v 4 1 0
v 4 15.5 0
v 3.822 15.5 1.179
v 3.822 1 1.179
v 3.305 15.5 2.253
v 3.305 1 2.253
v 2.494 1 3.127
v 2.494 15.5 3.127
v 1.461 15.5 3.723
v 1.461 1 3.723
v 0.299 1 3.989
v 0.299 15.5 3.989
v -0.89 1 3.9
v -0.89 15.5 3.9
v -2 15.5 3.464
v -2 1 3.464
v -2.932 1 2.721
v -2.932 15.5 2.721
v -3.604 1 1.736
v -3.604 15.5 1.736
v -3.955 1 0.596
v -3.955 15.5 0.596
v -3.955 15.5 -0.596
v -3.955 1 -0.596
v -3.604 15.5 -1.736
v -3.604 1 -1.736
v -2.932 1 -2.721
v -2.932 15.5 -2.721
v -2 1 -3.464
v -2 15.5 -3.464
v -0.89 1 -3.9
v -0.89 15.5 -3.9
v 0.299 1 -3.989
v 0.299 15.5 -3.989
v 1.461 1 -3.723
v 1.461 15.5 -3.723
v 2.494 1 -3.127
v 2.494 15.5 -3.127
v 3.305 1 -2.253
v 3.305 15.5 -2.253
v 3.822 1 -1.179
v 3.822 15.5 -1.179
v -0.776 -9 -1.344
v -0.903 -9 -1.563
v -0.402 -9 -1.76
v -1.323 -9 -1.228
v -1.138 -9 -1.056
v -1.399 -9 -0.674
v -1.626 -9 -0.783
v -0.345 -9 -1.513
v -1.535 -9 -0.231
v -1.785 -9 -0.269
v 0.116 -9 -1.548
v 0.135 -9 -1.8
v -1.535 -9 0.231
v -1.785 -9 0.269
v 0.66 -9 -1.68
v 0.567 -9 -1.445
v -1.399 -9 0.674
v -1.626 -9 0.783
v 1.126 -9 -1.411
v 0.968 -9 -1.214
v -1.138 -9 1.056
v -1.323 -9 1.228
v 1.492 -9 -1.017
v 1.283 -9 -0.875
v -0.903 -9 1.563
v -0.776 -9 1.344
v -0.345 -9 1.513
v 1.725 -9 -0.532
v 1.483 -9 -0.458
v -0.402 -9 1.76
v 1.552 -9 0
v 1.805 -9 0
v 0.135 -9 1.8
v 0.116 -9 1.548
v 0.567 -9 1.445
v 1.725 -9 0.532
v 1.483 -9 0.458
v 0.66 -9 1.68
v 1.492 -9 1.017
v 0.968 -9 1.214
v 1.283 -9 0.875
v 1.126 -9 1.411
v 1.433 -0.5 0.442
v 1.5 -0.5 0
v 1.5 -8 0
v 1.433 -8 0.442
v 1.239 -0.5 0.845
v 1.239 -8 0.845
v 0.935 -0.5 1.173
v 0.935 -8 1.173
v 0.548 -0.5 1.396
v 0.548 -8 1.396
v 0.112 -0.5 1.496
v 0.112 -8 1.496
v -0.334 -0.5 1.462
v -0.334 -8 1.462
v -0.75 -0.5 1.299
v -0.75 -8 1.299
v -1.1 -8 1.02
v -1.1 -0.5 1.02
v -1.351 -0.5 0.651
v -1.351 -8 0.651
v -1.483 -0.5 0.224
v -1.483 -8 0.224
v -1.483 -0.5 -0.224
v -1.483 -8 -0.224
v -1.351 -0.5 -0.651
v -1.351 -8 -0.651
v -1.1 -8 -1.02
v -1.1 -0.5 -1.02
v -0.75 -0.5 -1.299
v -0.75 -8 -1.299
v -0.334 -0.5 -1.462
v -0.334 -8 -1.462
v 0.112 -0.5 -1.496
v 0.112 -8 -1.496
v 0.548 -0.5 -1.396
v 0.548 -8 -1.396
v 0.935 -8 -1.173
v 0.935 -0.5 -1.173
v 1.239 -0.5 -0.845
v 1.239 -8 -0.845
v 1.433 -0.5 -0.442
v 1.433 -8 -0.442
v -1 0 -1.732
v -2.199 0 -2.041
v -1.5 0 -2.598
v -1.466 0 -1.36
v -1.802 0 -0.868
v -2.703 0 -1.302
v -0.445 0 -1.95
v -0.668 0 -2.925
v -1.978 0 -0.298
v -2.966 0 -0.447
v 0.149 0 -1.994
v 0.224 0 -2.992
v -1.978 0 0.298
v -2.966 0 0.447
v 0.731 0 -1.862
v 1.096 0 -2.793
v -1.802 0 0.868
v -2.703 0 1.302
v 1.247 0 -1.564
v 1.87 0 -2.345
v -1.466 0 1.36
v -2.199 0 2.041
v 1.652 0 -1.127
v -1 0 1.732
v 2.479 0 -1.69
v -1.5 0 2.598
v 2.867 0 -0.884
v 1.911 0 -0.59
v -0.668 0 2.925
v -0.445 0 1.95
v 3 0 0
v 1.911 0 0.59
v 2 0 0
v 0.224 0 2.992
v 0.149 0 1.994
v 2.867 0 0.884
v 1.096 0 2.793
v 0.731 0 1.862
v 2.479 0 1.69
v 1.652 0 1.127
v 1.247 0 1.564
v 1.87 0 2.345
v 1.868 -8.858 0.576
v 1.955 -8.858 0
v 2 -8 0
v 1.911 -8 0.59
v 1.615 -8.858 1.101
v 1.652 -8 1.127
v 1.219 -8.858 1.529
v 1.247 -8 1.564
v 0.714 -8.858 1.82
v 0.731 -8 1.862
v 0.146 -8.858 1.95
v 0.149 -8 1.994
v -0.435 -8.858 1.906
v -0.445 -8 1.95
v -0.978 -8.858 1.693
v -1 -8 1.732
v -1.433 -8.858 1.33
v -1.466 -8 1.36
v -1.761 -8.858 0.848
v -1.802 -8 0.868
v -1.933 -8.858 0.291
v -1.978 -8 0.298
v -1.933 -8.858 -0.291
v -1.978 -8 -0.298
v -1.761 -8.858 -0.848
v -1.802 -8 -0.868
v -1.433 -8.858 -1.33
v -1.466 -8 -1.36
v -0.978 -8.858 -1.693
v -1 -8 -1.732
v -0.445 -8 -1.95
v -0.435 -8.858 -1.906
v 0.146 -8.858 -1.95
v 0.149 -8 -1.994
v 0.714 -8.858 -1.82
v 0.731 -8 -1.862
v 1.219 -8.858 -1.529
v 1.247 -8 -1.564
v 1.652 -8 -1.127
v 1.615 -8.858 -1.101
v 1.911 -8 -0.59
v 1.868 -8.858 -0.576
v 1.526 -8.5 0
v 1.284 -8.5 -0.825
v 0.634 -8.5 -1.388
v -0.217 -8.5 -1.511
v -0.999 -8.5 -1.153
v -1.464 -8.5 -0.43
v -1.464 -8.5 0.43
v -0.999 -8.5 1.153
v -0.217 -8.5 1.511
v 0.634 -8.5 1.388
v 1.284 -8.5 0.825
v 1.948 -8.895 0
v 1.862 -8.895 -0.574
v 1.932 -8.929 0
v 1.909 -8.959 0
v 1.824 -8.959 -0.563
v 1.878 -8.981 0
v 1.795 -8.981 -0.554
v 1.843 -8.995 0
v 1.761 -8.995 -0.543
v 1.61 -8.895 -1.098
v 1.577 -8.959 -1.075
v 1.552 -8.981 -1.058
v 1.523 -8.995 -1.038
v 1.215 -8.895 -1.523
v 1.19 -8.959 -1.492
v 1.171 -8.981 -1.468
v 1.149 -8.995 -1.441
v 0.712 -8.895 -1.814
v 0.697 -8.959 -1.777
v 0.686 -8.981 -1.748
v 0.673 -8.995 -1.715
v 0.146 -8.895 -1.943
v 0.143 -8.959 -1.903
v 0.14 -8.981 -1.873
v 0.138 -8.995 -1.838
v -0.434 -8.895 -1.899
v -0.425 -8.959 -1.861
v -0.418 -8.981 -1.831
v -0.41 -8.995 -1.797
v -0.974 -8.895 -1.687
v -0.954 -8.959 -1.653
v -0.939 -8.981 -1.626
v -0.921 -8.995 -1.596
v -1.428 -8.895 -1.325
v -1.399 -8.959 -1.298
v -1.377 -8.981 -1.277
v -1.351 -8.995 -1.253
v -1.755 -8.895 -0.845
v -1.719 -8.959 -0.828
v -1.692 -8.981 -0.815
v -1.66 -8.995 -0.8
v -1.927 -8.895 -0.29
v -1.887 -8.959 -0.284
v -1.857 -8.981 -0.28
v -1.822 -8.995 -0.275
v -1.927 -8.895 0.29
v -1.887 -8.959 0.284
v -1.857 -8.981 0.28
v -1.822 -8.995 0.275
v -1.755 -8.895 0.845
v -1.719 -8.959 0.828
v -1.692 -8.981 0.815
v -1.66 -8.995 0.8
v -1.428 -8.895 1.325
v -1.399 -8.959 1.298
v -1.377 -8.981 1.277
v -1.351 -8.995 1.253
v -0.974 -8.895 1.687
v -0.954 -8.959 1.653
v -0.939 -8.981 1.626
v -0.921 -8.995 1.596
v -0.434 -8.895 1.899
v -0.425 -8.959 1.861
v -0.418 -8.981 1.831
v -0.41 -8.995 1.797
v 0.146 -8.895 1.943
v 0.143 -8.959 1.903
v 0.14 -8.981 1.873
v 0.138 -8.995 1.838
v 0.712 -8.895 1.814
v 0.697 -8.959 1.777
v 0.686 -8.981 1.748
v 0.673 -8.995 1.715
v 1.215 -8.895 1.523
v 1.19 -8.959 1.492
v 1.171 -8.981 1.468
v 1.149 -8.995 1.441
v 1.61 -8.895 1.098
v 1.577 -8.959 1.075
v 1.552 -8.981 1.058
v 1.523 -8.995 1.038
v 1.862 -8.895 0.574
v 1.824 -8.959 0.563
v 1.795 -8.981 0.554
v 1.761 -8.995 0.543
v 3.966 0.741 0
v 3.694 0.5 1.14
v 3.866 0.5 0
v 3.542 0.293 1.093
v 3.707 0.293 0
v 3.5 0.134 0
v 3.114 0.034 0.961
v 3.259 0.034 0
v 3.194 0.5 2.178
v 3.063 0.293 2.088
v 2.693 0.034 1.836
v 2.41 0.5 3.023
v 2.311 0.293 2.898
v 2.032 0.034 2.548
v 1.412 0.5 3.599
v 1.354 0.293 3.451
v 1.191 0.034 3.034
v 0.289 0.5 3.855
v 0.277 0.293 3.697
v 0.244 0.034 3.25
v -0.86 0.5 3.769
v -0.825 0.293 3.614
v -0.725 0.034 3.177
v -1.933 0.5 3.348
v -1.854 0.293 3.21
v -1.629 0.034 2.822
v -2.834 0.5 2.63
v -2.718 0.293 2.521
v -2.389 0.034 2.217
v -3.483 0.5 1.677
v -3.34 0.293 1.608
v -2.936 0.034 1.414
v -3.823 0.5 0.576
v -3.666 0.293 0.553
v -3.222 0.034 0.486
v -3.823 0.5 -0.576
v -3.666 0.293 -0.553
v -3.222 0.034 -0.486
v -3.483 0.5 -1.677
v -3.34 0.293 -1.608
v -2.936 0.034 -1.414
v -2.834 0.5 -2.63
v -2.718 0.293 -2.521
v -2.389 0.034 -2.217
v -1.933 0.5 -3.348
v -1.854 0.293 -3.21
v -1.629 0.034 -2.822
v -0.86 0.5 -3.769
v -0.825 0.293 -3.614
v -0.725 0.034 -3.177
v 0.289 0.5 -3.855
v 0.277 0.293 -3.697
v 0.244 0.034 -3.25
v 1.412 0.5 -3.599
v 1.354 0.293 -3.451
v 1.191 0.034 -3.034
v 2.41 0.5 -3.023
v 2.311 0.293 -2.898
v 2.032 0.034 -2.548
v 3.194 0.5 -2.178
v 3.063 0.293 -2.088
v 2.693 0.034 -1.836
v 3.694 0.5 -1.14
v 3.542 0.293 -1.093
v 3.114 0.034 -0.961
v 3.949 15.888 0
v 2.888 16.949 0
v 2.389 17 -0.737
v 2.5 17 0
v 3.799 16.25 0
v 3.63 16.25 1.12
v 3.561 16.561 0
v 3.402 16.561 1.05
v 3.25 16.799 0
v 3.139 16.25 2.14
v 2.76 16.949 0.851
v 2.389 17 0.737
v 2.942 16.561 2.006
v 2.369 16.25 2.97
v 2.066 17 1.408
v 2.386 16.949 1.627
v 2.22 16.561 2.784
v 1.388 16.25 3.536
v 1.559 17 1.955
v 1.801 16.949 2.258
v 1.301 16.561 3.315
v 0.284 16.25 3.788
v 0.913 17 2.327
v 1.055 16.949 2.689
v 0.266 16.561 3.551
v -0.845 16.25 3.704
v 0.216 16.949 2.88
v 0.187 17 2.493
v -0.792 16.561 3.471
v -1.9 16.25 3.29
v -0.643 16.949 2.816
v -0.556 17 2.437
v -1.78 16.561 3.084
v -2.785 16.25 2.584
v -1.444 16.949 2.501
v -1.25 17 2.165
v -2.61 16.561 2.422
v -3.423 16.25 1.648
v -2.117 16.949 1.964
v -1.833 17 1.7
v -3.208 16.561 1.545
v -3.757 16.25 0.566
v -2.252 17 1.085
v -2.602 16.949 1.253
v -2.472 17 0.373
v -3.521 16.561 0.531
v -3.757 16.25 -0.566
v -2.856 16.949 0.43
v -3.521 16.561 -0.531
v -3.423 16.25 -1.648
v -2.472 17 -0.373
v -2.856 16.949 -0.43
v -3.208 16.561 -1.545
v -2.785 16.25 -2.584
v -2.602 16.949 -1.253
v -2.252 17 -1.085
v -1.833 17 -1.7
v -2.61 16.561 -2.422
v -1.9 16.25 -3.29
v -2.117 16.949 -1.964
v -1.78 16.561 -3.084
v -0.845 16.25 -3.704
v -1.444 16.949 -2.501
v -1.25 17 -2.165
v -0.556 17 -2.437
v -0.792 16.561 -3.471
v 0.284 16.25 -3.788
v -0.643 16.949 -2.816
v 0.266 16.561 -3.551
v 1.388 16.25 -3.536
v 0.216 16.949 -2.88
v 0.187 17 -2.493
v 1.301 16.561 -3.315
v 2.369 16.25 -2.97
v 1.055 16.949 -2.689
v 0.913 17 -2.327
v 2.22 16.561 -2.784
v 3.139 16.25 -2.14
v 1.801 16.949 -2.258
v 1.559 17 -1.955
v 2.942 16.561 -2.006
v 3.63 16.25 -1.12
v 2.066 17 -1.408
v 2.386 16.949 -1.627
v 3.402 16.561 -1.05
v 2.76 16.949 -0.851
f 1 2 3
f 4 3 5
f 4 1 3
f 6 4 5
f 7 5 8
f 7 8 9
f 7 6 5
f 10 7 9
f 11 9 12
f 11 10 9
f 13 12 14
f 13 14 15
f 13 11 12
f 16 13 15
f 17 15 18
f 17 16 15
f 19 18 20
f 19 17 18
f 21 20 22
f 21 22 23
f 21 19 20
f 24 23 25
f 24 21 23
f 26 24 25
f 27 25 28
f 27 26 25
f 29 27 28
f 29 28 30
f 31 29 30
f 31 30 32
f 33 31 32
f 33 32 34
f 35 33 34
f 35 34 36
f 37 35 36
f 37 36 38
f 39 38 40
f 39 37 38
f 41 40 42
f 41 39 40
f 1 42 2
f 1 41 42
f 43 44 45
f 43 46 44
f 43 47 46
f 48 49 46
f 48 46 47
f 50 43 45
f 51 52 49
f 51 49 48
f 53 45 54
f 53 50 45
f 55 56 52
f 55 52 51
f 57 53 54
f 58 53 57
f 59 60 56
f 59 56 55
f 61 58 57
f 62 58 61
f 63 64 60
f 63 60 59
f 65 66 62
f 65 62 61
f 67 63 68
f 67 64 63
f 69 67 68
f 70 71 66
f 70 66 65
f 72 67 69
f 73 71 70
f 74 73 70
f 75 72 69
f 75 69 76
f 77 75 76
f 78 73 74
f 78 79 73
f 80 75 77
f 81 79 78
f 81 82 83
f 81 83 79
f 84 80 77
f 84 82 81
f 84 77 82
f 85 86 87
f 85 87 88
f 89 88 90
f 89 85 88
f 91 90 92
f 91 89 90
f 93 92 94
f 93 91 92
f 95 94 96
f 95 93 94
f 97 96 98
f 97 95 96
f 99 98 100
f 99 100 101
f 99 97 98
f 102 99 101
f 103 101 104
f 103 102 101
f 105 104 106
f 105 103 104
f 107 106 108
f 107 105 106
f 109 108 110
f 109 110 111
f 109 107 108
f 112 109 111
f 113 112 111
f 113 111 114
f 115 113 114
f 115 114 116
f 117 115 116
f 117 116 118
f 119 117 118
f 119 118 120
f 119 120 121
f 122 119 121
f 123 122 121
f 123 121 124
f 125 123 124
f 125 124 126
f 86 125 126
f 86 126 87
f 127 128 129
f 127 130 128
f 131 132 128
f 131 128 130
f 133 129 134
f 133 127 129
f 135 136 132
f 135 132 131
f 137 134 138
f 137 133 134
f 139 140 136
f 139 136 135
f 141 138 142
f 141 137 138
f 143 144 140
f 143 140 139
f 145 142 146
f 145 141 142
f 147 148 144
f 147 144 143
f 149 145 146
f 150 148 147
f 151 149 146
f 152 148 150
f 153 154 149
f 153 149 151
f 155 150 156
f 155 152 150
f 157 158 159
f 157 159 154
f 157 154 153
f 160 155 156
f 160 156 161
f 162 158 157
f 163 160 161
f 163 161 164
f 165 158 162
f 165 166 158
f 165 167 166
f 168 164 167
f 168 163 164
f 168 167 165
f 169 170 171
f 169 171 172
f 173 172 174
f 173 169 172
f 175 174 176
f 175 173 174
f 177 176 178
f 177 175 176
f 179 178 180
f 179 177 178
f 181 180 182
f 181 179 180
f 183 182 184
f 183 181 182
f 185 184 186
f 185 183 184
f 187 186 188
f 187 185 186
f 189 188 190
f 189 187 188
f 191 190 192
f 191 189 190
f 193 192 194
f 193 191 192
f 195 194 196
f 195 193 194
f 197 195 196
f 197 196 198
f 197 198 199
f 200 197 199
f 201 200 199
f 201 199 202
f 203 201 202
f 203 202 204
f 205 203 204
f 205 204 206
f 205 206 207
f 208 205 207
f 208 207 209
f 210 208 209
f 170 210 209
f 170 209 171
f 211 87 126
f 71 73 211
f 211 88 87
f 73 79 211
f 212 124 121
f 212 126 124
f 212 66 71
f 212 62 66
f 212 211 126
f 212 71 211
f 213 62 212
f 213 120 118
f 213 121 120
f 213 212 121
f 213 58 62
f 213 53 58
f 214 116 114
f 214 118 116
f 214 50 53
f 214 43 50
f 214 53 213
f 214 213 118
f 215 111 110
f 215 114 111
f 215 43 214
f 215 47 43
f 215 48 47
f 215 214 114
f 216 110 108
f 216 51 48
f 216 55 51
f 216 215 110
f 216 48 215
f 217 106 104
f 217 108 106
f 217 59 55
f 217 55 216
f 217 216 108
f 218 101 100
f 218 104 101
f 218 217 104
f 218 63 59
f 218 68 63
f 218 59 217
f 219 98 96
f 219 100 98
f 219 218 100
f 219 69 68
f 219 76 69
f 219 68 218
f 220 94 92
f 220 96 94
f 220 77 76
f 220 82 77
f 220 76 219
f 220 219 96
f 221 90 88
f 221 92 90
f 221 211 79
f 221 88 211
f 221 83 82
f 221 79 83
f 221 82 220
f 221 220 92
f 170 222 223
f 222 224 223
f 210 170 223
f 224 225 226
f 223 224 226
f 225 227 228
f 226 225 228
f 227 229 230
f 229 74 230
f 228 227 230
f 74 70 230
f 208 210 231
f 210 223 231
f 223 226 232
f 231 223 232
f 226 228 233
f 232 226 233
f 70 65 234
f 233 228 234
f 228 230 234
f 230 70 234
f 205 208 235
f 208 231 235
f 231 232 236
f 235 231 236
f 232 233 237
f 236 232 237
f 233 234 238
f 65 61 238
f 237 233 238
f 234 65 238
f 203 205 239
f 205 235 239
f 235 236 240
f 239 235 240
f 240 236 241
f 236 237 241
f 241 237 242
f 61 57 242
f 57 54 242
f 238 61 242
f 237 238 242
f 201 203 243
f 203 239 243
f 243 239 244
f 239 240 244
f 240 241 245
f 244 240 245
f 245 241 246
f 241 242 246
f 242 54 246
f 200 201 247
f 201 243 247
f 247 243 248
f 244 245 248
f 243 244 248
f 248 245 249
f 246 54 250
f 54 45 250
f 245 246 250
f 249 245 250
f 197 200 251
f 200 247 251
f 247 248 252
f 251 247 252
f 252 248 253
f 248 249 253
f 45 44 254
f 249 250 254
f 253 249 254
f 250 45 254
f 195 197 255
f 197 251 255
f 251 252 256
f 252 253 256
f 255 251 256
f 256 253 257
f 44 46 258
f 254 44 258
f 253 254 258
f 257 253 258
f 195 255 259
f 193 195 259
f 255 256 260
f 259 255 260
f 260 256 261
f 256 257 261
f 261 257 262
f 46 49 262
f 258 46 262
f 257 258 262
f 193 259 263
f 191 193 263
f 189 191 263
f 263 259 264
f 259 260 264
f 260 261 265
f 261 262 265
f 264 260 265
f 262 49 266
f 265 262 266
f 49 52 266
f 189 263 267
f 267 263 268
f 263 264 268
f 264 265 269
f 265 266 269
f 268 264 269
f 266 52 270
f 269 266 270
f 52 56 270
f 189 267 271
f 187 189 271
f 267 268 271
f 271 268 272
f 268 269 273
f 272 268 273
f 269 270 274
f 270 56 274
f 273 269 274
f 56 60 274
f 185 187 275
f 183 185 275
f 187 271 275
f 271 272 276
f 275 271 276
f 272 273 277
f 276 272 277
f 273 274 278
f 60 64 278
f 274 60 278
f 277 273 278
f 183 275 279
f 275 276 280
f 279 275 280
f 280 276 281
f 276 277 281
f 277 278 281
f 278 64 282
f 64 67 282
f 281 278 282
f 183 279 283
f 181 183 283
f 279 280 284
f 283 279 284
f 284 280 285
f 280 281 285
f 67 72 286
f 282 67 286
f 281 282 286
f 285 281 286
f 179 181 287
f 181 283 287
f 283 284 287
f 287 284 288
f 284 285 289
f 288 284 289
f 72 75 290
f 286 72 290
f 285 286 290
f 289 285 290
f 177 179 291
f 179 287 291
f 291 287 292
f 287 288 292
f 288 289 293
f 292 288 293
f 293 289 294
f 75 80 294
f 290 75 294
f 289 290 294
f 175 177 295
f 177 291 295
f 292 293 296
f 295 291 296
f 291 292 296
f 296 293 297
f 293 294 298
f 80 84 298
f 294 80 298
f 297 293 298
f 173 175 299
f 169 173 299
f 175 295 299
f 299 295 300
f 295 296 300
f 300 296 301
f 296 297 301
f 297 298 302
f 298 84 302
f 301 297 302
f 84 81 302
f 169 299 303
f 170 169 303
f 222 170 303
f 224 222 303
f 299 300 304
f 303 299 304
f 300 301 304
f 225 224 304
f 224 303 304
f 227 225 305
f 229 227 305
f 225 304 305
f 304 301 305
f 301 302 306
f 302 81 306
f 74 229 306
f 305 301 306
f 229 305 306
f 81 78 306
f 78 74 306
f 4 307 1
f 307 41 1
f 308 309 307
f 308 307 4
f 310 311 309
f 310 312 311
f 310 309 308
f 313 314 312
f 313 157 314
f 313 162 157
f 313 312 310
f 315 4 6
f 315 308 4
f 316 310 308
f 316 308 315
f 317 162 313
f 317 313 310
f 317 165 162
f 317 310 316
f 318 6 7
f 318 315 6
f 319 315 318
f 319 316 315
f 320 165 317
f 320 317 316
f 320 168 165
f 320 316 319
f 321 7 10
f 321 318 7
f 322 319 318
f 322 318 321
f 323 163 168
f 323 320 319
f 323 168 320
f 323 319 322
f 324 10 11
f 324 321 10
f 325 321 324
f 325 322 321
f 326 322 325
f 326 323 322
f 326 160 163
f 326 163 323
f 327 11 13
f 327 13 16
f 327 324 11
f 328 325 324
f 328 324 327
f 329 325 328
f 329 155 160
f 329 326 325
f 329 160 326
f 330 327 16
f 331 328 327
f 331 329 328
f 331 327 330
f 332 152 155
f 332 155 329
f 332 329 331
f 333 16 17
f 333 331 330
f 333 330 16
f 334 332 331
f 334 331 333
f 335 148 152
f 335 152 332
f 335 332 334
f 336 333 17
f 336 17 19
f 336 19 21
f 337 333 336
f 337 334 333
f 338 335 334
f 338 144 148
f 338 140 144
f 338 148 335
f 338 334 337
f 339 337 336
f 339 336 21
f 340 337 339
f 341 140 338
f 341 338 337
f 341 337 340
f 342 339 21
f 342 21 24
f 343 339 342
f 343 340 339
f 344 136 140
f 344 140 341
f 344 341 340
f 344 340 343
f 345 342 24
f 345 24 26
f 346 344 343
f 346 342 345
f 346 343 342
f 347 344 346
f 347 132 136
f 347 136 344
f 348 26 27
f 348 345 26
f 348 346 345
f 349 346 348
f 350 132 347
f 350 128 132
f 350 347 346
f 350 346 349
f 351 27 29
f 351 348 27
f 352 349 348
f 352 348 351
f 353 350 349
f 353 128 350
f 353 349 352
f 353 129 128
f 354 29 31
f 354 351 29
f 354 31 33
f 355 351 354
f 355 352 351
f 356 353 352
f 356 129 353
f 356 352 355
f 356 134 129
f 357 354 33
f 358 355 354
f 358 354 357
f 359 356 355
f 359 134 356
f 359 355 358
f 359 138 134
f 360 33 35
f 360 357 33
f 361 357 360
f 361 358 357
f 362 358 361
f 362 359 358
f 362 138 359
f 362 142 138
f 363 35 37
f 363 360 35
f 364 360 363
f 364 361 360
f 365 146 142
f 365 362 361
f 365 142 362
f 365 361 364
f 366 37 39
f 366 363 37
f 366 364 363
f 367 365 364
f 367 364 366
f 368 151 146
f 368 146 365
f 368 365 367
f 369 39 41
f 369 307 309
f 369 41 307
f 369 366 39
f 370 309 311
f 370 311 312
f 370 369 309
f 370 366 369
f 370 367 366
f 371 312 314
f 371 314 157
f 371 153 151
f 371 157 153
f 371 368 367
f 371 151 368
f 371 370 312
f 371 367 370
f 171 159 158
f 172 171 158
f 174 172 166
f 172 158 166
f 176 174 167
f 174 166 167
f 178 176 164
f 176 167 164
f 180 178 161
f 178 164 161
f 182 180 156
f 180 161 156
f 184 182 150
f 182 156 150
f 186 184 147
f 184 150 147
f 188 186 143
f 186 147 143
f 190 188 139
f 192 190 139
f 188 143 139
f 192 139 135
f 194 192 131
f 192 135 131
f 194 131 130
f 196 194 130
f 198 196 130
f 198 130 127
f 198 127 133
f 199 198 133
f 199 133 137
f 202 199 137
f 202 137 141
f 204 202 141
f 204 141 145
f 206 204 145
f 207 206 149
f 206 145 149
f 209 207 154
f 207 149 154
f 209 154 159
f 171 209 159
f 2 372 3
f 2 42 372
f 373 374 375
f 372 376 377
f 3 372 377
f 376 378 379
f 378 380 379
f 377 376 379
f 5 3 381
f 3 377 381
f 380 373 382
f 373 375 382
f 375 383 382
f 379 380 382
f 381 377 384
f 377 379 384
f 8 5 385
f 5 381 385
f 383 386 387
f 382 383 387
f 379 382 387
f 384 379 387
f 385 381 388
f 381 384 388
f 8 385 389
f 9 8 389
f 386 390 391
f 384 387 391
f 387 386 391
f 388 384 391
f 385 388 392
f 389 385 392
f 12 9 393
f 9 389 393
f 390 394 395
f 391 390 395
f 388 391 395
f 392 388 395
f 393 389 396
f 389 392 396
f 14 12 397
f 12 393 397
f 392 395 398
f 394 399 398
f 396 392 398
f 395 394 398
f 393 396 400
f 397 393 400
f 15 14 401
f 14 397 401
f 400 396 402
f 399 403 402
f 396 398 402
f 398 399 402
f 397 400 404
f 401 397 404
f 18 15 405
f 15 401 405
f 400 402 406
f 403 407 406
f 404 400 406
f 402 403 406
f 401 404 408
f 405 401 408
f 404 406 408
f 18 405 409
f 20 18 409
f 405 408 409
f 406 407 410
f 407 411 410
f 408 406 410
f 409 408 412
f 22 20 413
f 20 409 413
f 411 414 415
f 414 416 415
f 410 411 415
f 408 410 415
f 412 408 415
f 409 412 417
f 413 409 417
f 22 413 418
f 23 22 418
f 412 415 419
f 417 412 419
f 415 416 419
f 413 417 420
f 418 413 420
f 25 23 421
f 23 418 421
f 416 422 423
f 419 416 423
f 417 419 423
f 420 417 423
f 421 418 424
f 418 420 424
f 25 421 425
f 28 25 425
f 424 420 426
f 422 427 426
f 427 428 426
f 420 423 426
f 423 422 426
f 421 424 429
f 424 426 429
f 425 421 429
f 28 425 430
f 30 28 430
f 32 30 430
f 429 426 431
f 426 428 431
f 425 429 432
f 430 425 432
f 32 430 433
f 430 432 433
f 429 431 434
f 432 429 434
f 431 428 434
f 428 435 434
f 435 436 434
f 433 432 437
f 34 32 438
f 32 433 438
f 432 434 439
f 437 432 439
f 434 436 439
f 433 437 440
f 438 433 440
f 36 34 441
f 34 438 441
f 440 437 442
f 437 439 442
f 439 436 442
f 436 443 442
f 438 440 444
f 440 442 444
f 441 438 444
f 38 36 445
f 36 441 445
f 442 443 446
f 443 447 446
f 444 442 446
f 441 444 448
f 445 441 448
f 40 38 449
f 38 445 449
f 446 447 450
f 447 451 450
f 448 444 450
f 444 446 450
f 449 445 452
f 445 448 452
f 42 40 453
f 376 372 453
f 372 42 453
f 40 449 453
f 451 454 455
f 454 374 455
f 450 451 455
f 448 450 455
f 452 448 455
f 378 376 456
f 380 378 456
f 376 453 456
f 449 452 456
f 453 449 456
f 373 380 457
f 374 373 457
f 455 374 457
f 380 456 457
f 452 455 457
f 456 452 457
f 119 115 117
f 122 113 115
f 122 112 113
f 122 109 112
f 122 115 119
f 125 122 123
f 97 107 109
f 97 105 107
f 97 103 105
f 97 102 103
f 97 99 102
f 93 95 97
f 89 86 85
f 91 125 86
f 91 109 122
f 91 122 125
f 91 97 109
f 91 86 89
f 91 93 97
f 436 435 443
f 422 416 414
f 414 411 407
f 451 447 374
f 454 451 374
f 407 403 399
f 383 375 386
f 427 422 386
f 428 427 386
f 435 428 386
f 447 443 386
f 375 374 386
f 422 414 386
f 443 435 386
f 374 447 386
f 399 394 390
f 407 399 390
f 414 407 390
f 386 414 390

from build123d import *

# Parameters (mm, degrees)
F0_R        = 2
F1_DEPTH    = 8
F2_T        = -0.5
F1_FACE_R   = 2
F1_FACE_R_2 = 1.5
F3_DEPTH    = 1
F3_TAPER    = 3
F4_R        = 0.15
F5_R        = 4
F6_DEPTH    = 17
F7_R        = 1
F8_R        = 1.5


with BuildPart() as f1:
    # F0 (on Front) → F1 (new body)
    with BuildSketch(Plane.XZ):
        Circle(F0_R)
    extrude(amount=F1_DEPTH)

    # F2
    f2_openings = [f1.faces().sort_by_distance(p)[0] for p in [
        (0, -8, 0),
    ]]
    offset(amount=F2_T, openings=f2_openings)

    # F1_face (on face) → F3 (join)
    with BuildSketch(Plane.XZ.offset(8)):
        Circle(F1_FACE_R)
        Circle(F1_FACE_R_2, mode=Mode.SUBTRACT)
    extrude(amount=F3_DEPTH, taper=F3_TAPER)

    # F4
    f4_edges = [f1.edges().sort_by_distance(p)[0] for p in [
        (-1.947592, -9, 0),
    ]]
    fillet(f4_edges, radius=F4_R)

    # F5 (on Front) → F6 (join)
    with BuildSketch(Plane.XZ):
        Circle(F5_R)
    extrude(amount=-F6_DEPTH)

    # F7
    f7_edges = [f1.edges().sort_by_distance(p)[0] for p in [
        (-4, 0, 0),
    ]]
    fillet(f7_edges, radius=F7_R)

    # F8
    f8_edges = [f1.edges().sort_by_distance(p)[0] for p in [
        (-4, 17, 0),
    ]]
    fillet(f8_edges, radius=F8_R)


solid = f1.part
